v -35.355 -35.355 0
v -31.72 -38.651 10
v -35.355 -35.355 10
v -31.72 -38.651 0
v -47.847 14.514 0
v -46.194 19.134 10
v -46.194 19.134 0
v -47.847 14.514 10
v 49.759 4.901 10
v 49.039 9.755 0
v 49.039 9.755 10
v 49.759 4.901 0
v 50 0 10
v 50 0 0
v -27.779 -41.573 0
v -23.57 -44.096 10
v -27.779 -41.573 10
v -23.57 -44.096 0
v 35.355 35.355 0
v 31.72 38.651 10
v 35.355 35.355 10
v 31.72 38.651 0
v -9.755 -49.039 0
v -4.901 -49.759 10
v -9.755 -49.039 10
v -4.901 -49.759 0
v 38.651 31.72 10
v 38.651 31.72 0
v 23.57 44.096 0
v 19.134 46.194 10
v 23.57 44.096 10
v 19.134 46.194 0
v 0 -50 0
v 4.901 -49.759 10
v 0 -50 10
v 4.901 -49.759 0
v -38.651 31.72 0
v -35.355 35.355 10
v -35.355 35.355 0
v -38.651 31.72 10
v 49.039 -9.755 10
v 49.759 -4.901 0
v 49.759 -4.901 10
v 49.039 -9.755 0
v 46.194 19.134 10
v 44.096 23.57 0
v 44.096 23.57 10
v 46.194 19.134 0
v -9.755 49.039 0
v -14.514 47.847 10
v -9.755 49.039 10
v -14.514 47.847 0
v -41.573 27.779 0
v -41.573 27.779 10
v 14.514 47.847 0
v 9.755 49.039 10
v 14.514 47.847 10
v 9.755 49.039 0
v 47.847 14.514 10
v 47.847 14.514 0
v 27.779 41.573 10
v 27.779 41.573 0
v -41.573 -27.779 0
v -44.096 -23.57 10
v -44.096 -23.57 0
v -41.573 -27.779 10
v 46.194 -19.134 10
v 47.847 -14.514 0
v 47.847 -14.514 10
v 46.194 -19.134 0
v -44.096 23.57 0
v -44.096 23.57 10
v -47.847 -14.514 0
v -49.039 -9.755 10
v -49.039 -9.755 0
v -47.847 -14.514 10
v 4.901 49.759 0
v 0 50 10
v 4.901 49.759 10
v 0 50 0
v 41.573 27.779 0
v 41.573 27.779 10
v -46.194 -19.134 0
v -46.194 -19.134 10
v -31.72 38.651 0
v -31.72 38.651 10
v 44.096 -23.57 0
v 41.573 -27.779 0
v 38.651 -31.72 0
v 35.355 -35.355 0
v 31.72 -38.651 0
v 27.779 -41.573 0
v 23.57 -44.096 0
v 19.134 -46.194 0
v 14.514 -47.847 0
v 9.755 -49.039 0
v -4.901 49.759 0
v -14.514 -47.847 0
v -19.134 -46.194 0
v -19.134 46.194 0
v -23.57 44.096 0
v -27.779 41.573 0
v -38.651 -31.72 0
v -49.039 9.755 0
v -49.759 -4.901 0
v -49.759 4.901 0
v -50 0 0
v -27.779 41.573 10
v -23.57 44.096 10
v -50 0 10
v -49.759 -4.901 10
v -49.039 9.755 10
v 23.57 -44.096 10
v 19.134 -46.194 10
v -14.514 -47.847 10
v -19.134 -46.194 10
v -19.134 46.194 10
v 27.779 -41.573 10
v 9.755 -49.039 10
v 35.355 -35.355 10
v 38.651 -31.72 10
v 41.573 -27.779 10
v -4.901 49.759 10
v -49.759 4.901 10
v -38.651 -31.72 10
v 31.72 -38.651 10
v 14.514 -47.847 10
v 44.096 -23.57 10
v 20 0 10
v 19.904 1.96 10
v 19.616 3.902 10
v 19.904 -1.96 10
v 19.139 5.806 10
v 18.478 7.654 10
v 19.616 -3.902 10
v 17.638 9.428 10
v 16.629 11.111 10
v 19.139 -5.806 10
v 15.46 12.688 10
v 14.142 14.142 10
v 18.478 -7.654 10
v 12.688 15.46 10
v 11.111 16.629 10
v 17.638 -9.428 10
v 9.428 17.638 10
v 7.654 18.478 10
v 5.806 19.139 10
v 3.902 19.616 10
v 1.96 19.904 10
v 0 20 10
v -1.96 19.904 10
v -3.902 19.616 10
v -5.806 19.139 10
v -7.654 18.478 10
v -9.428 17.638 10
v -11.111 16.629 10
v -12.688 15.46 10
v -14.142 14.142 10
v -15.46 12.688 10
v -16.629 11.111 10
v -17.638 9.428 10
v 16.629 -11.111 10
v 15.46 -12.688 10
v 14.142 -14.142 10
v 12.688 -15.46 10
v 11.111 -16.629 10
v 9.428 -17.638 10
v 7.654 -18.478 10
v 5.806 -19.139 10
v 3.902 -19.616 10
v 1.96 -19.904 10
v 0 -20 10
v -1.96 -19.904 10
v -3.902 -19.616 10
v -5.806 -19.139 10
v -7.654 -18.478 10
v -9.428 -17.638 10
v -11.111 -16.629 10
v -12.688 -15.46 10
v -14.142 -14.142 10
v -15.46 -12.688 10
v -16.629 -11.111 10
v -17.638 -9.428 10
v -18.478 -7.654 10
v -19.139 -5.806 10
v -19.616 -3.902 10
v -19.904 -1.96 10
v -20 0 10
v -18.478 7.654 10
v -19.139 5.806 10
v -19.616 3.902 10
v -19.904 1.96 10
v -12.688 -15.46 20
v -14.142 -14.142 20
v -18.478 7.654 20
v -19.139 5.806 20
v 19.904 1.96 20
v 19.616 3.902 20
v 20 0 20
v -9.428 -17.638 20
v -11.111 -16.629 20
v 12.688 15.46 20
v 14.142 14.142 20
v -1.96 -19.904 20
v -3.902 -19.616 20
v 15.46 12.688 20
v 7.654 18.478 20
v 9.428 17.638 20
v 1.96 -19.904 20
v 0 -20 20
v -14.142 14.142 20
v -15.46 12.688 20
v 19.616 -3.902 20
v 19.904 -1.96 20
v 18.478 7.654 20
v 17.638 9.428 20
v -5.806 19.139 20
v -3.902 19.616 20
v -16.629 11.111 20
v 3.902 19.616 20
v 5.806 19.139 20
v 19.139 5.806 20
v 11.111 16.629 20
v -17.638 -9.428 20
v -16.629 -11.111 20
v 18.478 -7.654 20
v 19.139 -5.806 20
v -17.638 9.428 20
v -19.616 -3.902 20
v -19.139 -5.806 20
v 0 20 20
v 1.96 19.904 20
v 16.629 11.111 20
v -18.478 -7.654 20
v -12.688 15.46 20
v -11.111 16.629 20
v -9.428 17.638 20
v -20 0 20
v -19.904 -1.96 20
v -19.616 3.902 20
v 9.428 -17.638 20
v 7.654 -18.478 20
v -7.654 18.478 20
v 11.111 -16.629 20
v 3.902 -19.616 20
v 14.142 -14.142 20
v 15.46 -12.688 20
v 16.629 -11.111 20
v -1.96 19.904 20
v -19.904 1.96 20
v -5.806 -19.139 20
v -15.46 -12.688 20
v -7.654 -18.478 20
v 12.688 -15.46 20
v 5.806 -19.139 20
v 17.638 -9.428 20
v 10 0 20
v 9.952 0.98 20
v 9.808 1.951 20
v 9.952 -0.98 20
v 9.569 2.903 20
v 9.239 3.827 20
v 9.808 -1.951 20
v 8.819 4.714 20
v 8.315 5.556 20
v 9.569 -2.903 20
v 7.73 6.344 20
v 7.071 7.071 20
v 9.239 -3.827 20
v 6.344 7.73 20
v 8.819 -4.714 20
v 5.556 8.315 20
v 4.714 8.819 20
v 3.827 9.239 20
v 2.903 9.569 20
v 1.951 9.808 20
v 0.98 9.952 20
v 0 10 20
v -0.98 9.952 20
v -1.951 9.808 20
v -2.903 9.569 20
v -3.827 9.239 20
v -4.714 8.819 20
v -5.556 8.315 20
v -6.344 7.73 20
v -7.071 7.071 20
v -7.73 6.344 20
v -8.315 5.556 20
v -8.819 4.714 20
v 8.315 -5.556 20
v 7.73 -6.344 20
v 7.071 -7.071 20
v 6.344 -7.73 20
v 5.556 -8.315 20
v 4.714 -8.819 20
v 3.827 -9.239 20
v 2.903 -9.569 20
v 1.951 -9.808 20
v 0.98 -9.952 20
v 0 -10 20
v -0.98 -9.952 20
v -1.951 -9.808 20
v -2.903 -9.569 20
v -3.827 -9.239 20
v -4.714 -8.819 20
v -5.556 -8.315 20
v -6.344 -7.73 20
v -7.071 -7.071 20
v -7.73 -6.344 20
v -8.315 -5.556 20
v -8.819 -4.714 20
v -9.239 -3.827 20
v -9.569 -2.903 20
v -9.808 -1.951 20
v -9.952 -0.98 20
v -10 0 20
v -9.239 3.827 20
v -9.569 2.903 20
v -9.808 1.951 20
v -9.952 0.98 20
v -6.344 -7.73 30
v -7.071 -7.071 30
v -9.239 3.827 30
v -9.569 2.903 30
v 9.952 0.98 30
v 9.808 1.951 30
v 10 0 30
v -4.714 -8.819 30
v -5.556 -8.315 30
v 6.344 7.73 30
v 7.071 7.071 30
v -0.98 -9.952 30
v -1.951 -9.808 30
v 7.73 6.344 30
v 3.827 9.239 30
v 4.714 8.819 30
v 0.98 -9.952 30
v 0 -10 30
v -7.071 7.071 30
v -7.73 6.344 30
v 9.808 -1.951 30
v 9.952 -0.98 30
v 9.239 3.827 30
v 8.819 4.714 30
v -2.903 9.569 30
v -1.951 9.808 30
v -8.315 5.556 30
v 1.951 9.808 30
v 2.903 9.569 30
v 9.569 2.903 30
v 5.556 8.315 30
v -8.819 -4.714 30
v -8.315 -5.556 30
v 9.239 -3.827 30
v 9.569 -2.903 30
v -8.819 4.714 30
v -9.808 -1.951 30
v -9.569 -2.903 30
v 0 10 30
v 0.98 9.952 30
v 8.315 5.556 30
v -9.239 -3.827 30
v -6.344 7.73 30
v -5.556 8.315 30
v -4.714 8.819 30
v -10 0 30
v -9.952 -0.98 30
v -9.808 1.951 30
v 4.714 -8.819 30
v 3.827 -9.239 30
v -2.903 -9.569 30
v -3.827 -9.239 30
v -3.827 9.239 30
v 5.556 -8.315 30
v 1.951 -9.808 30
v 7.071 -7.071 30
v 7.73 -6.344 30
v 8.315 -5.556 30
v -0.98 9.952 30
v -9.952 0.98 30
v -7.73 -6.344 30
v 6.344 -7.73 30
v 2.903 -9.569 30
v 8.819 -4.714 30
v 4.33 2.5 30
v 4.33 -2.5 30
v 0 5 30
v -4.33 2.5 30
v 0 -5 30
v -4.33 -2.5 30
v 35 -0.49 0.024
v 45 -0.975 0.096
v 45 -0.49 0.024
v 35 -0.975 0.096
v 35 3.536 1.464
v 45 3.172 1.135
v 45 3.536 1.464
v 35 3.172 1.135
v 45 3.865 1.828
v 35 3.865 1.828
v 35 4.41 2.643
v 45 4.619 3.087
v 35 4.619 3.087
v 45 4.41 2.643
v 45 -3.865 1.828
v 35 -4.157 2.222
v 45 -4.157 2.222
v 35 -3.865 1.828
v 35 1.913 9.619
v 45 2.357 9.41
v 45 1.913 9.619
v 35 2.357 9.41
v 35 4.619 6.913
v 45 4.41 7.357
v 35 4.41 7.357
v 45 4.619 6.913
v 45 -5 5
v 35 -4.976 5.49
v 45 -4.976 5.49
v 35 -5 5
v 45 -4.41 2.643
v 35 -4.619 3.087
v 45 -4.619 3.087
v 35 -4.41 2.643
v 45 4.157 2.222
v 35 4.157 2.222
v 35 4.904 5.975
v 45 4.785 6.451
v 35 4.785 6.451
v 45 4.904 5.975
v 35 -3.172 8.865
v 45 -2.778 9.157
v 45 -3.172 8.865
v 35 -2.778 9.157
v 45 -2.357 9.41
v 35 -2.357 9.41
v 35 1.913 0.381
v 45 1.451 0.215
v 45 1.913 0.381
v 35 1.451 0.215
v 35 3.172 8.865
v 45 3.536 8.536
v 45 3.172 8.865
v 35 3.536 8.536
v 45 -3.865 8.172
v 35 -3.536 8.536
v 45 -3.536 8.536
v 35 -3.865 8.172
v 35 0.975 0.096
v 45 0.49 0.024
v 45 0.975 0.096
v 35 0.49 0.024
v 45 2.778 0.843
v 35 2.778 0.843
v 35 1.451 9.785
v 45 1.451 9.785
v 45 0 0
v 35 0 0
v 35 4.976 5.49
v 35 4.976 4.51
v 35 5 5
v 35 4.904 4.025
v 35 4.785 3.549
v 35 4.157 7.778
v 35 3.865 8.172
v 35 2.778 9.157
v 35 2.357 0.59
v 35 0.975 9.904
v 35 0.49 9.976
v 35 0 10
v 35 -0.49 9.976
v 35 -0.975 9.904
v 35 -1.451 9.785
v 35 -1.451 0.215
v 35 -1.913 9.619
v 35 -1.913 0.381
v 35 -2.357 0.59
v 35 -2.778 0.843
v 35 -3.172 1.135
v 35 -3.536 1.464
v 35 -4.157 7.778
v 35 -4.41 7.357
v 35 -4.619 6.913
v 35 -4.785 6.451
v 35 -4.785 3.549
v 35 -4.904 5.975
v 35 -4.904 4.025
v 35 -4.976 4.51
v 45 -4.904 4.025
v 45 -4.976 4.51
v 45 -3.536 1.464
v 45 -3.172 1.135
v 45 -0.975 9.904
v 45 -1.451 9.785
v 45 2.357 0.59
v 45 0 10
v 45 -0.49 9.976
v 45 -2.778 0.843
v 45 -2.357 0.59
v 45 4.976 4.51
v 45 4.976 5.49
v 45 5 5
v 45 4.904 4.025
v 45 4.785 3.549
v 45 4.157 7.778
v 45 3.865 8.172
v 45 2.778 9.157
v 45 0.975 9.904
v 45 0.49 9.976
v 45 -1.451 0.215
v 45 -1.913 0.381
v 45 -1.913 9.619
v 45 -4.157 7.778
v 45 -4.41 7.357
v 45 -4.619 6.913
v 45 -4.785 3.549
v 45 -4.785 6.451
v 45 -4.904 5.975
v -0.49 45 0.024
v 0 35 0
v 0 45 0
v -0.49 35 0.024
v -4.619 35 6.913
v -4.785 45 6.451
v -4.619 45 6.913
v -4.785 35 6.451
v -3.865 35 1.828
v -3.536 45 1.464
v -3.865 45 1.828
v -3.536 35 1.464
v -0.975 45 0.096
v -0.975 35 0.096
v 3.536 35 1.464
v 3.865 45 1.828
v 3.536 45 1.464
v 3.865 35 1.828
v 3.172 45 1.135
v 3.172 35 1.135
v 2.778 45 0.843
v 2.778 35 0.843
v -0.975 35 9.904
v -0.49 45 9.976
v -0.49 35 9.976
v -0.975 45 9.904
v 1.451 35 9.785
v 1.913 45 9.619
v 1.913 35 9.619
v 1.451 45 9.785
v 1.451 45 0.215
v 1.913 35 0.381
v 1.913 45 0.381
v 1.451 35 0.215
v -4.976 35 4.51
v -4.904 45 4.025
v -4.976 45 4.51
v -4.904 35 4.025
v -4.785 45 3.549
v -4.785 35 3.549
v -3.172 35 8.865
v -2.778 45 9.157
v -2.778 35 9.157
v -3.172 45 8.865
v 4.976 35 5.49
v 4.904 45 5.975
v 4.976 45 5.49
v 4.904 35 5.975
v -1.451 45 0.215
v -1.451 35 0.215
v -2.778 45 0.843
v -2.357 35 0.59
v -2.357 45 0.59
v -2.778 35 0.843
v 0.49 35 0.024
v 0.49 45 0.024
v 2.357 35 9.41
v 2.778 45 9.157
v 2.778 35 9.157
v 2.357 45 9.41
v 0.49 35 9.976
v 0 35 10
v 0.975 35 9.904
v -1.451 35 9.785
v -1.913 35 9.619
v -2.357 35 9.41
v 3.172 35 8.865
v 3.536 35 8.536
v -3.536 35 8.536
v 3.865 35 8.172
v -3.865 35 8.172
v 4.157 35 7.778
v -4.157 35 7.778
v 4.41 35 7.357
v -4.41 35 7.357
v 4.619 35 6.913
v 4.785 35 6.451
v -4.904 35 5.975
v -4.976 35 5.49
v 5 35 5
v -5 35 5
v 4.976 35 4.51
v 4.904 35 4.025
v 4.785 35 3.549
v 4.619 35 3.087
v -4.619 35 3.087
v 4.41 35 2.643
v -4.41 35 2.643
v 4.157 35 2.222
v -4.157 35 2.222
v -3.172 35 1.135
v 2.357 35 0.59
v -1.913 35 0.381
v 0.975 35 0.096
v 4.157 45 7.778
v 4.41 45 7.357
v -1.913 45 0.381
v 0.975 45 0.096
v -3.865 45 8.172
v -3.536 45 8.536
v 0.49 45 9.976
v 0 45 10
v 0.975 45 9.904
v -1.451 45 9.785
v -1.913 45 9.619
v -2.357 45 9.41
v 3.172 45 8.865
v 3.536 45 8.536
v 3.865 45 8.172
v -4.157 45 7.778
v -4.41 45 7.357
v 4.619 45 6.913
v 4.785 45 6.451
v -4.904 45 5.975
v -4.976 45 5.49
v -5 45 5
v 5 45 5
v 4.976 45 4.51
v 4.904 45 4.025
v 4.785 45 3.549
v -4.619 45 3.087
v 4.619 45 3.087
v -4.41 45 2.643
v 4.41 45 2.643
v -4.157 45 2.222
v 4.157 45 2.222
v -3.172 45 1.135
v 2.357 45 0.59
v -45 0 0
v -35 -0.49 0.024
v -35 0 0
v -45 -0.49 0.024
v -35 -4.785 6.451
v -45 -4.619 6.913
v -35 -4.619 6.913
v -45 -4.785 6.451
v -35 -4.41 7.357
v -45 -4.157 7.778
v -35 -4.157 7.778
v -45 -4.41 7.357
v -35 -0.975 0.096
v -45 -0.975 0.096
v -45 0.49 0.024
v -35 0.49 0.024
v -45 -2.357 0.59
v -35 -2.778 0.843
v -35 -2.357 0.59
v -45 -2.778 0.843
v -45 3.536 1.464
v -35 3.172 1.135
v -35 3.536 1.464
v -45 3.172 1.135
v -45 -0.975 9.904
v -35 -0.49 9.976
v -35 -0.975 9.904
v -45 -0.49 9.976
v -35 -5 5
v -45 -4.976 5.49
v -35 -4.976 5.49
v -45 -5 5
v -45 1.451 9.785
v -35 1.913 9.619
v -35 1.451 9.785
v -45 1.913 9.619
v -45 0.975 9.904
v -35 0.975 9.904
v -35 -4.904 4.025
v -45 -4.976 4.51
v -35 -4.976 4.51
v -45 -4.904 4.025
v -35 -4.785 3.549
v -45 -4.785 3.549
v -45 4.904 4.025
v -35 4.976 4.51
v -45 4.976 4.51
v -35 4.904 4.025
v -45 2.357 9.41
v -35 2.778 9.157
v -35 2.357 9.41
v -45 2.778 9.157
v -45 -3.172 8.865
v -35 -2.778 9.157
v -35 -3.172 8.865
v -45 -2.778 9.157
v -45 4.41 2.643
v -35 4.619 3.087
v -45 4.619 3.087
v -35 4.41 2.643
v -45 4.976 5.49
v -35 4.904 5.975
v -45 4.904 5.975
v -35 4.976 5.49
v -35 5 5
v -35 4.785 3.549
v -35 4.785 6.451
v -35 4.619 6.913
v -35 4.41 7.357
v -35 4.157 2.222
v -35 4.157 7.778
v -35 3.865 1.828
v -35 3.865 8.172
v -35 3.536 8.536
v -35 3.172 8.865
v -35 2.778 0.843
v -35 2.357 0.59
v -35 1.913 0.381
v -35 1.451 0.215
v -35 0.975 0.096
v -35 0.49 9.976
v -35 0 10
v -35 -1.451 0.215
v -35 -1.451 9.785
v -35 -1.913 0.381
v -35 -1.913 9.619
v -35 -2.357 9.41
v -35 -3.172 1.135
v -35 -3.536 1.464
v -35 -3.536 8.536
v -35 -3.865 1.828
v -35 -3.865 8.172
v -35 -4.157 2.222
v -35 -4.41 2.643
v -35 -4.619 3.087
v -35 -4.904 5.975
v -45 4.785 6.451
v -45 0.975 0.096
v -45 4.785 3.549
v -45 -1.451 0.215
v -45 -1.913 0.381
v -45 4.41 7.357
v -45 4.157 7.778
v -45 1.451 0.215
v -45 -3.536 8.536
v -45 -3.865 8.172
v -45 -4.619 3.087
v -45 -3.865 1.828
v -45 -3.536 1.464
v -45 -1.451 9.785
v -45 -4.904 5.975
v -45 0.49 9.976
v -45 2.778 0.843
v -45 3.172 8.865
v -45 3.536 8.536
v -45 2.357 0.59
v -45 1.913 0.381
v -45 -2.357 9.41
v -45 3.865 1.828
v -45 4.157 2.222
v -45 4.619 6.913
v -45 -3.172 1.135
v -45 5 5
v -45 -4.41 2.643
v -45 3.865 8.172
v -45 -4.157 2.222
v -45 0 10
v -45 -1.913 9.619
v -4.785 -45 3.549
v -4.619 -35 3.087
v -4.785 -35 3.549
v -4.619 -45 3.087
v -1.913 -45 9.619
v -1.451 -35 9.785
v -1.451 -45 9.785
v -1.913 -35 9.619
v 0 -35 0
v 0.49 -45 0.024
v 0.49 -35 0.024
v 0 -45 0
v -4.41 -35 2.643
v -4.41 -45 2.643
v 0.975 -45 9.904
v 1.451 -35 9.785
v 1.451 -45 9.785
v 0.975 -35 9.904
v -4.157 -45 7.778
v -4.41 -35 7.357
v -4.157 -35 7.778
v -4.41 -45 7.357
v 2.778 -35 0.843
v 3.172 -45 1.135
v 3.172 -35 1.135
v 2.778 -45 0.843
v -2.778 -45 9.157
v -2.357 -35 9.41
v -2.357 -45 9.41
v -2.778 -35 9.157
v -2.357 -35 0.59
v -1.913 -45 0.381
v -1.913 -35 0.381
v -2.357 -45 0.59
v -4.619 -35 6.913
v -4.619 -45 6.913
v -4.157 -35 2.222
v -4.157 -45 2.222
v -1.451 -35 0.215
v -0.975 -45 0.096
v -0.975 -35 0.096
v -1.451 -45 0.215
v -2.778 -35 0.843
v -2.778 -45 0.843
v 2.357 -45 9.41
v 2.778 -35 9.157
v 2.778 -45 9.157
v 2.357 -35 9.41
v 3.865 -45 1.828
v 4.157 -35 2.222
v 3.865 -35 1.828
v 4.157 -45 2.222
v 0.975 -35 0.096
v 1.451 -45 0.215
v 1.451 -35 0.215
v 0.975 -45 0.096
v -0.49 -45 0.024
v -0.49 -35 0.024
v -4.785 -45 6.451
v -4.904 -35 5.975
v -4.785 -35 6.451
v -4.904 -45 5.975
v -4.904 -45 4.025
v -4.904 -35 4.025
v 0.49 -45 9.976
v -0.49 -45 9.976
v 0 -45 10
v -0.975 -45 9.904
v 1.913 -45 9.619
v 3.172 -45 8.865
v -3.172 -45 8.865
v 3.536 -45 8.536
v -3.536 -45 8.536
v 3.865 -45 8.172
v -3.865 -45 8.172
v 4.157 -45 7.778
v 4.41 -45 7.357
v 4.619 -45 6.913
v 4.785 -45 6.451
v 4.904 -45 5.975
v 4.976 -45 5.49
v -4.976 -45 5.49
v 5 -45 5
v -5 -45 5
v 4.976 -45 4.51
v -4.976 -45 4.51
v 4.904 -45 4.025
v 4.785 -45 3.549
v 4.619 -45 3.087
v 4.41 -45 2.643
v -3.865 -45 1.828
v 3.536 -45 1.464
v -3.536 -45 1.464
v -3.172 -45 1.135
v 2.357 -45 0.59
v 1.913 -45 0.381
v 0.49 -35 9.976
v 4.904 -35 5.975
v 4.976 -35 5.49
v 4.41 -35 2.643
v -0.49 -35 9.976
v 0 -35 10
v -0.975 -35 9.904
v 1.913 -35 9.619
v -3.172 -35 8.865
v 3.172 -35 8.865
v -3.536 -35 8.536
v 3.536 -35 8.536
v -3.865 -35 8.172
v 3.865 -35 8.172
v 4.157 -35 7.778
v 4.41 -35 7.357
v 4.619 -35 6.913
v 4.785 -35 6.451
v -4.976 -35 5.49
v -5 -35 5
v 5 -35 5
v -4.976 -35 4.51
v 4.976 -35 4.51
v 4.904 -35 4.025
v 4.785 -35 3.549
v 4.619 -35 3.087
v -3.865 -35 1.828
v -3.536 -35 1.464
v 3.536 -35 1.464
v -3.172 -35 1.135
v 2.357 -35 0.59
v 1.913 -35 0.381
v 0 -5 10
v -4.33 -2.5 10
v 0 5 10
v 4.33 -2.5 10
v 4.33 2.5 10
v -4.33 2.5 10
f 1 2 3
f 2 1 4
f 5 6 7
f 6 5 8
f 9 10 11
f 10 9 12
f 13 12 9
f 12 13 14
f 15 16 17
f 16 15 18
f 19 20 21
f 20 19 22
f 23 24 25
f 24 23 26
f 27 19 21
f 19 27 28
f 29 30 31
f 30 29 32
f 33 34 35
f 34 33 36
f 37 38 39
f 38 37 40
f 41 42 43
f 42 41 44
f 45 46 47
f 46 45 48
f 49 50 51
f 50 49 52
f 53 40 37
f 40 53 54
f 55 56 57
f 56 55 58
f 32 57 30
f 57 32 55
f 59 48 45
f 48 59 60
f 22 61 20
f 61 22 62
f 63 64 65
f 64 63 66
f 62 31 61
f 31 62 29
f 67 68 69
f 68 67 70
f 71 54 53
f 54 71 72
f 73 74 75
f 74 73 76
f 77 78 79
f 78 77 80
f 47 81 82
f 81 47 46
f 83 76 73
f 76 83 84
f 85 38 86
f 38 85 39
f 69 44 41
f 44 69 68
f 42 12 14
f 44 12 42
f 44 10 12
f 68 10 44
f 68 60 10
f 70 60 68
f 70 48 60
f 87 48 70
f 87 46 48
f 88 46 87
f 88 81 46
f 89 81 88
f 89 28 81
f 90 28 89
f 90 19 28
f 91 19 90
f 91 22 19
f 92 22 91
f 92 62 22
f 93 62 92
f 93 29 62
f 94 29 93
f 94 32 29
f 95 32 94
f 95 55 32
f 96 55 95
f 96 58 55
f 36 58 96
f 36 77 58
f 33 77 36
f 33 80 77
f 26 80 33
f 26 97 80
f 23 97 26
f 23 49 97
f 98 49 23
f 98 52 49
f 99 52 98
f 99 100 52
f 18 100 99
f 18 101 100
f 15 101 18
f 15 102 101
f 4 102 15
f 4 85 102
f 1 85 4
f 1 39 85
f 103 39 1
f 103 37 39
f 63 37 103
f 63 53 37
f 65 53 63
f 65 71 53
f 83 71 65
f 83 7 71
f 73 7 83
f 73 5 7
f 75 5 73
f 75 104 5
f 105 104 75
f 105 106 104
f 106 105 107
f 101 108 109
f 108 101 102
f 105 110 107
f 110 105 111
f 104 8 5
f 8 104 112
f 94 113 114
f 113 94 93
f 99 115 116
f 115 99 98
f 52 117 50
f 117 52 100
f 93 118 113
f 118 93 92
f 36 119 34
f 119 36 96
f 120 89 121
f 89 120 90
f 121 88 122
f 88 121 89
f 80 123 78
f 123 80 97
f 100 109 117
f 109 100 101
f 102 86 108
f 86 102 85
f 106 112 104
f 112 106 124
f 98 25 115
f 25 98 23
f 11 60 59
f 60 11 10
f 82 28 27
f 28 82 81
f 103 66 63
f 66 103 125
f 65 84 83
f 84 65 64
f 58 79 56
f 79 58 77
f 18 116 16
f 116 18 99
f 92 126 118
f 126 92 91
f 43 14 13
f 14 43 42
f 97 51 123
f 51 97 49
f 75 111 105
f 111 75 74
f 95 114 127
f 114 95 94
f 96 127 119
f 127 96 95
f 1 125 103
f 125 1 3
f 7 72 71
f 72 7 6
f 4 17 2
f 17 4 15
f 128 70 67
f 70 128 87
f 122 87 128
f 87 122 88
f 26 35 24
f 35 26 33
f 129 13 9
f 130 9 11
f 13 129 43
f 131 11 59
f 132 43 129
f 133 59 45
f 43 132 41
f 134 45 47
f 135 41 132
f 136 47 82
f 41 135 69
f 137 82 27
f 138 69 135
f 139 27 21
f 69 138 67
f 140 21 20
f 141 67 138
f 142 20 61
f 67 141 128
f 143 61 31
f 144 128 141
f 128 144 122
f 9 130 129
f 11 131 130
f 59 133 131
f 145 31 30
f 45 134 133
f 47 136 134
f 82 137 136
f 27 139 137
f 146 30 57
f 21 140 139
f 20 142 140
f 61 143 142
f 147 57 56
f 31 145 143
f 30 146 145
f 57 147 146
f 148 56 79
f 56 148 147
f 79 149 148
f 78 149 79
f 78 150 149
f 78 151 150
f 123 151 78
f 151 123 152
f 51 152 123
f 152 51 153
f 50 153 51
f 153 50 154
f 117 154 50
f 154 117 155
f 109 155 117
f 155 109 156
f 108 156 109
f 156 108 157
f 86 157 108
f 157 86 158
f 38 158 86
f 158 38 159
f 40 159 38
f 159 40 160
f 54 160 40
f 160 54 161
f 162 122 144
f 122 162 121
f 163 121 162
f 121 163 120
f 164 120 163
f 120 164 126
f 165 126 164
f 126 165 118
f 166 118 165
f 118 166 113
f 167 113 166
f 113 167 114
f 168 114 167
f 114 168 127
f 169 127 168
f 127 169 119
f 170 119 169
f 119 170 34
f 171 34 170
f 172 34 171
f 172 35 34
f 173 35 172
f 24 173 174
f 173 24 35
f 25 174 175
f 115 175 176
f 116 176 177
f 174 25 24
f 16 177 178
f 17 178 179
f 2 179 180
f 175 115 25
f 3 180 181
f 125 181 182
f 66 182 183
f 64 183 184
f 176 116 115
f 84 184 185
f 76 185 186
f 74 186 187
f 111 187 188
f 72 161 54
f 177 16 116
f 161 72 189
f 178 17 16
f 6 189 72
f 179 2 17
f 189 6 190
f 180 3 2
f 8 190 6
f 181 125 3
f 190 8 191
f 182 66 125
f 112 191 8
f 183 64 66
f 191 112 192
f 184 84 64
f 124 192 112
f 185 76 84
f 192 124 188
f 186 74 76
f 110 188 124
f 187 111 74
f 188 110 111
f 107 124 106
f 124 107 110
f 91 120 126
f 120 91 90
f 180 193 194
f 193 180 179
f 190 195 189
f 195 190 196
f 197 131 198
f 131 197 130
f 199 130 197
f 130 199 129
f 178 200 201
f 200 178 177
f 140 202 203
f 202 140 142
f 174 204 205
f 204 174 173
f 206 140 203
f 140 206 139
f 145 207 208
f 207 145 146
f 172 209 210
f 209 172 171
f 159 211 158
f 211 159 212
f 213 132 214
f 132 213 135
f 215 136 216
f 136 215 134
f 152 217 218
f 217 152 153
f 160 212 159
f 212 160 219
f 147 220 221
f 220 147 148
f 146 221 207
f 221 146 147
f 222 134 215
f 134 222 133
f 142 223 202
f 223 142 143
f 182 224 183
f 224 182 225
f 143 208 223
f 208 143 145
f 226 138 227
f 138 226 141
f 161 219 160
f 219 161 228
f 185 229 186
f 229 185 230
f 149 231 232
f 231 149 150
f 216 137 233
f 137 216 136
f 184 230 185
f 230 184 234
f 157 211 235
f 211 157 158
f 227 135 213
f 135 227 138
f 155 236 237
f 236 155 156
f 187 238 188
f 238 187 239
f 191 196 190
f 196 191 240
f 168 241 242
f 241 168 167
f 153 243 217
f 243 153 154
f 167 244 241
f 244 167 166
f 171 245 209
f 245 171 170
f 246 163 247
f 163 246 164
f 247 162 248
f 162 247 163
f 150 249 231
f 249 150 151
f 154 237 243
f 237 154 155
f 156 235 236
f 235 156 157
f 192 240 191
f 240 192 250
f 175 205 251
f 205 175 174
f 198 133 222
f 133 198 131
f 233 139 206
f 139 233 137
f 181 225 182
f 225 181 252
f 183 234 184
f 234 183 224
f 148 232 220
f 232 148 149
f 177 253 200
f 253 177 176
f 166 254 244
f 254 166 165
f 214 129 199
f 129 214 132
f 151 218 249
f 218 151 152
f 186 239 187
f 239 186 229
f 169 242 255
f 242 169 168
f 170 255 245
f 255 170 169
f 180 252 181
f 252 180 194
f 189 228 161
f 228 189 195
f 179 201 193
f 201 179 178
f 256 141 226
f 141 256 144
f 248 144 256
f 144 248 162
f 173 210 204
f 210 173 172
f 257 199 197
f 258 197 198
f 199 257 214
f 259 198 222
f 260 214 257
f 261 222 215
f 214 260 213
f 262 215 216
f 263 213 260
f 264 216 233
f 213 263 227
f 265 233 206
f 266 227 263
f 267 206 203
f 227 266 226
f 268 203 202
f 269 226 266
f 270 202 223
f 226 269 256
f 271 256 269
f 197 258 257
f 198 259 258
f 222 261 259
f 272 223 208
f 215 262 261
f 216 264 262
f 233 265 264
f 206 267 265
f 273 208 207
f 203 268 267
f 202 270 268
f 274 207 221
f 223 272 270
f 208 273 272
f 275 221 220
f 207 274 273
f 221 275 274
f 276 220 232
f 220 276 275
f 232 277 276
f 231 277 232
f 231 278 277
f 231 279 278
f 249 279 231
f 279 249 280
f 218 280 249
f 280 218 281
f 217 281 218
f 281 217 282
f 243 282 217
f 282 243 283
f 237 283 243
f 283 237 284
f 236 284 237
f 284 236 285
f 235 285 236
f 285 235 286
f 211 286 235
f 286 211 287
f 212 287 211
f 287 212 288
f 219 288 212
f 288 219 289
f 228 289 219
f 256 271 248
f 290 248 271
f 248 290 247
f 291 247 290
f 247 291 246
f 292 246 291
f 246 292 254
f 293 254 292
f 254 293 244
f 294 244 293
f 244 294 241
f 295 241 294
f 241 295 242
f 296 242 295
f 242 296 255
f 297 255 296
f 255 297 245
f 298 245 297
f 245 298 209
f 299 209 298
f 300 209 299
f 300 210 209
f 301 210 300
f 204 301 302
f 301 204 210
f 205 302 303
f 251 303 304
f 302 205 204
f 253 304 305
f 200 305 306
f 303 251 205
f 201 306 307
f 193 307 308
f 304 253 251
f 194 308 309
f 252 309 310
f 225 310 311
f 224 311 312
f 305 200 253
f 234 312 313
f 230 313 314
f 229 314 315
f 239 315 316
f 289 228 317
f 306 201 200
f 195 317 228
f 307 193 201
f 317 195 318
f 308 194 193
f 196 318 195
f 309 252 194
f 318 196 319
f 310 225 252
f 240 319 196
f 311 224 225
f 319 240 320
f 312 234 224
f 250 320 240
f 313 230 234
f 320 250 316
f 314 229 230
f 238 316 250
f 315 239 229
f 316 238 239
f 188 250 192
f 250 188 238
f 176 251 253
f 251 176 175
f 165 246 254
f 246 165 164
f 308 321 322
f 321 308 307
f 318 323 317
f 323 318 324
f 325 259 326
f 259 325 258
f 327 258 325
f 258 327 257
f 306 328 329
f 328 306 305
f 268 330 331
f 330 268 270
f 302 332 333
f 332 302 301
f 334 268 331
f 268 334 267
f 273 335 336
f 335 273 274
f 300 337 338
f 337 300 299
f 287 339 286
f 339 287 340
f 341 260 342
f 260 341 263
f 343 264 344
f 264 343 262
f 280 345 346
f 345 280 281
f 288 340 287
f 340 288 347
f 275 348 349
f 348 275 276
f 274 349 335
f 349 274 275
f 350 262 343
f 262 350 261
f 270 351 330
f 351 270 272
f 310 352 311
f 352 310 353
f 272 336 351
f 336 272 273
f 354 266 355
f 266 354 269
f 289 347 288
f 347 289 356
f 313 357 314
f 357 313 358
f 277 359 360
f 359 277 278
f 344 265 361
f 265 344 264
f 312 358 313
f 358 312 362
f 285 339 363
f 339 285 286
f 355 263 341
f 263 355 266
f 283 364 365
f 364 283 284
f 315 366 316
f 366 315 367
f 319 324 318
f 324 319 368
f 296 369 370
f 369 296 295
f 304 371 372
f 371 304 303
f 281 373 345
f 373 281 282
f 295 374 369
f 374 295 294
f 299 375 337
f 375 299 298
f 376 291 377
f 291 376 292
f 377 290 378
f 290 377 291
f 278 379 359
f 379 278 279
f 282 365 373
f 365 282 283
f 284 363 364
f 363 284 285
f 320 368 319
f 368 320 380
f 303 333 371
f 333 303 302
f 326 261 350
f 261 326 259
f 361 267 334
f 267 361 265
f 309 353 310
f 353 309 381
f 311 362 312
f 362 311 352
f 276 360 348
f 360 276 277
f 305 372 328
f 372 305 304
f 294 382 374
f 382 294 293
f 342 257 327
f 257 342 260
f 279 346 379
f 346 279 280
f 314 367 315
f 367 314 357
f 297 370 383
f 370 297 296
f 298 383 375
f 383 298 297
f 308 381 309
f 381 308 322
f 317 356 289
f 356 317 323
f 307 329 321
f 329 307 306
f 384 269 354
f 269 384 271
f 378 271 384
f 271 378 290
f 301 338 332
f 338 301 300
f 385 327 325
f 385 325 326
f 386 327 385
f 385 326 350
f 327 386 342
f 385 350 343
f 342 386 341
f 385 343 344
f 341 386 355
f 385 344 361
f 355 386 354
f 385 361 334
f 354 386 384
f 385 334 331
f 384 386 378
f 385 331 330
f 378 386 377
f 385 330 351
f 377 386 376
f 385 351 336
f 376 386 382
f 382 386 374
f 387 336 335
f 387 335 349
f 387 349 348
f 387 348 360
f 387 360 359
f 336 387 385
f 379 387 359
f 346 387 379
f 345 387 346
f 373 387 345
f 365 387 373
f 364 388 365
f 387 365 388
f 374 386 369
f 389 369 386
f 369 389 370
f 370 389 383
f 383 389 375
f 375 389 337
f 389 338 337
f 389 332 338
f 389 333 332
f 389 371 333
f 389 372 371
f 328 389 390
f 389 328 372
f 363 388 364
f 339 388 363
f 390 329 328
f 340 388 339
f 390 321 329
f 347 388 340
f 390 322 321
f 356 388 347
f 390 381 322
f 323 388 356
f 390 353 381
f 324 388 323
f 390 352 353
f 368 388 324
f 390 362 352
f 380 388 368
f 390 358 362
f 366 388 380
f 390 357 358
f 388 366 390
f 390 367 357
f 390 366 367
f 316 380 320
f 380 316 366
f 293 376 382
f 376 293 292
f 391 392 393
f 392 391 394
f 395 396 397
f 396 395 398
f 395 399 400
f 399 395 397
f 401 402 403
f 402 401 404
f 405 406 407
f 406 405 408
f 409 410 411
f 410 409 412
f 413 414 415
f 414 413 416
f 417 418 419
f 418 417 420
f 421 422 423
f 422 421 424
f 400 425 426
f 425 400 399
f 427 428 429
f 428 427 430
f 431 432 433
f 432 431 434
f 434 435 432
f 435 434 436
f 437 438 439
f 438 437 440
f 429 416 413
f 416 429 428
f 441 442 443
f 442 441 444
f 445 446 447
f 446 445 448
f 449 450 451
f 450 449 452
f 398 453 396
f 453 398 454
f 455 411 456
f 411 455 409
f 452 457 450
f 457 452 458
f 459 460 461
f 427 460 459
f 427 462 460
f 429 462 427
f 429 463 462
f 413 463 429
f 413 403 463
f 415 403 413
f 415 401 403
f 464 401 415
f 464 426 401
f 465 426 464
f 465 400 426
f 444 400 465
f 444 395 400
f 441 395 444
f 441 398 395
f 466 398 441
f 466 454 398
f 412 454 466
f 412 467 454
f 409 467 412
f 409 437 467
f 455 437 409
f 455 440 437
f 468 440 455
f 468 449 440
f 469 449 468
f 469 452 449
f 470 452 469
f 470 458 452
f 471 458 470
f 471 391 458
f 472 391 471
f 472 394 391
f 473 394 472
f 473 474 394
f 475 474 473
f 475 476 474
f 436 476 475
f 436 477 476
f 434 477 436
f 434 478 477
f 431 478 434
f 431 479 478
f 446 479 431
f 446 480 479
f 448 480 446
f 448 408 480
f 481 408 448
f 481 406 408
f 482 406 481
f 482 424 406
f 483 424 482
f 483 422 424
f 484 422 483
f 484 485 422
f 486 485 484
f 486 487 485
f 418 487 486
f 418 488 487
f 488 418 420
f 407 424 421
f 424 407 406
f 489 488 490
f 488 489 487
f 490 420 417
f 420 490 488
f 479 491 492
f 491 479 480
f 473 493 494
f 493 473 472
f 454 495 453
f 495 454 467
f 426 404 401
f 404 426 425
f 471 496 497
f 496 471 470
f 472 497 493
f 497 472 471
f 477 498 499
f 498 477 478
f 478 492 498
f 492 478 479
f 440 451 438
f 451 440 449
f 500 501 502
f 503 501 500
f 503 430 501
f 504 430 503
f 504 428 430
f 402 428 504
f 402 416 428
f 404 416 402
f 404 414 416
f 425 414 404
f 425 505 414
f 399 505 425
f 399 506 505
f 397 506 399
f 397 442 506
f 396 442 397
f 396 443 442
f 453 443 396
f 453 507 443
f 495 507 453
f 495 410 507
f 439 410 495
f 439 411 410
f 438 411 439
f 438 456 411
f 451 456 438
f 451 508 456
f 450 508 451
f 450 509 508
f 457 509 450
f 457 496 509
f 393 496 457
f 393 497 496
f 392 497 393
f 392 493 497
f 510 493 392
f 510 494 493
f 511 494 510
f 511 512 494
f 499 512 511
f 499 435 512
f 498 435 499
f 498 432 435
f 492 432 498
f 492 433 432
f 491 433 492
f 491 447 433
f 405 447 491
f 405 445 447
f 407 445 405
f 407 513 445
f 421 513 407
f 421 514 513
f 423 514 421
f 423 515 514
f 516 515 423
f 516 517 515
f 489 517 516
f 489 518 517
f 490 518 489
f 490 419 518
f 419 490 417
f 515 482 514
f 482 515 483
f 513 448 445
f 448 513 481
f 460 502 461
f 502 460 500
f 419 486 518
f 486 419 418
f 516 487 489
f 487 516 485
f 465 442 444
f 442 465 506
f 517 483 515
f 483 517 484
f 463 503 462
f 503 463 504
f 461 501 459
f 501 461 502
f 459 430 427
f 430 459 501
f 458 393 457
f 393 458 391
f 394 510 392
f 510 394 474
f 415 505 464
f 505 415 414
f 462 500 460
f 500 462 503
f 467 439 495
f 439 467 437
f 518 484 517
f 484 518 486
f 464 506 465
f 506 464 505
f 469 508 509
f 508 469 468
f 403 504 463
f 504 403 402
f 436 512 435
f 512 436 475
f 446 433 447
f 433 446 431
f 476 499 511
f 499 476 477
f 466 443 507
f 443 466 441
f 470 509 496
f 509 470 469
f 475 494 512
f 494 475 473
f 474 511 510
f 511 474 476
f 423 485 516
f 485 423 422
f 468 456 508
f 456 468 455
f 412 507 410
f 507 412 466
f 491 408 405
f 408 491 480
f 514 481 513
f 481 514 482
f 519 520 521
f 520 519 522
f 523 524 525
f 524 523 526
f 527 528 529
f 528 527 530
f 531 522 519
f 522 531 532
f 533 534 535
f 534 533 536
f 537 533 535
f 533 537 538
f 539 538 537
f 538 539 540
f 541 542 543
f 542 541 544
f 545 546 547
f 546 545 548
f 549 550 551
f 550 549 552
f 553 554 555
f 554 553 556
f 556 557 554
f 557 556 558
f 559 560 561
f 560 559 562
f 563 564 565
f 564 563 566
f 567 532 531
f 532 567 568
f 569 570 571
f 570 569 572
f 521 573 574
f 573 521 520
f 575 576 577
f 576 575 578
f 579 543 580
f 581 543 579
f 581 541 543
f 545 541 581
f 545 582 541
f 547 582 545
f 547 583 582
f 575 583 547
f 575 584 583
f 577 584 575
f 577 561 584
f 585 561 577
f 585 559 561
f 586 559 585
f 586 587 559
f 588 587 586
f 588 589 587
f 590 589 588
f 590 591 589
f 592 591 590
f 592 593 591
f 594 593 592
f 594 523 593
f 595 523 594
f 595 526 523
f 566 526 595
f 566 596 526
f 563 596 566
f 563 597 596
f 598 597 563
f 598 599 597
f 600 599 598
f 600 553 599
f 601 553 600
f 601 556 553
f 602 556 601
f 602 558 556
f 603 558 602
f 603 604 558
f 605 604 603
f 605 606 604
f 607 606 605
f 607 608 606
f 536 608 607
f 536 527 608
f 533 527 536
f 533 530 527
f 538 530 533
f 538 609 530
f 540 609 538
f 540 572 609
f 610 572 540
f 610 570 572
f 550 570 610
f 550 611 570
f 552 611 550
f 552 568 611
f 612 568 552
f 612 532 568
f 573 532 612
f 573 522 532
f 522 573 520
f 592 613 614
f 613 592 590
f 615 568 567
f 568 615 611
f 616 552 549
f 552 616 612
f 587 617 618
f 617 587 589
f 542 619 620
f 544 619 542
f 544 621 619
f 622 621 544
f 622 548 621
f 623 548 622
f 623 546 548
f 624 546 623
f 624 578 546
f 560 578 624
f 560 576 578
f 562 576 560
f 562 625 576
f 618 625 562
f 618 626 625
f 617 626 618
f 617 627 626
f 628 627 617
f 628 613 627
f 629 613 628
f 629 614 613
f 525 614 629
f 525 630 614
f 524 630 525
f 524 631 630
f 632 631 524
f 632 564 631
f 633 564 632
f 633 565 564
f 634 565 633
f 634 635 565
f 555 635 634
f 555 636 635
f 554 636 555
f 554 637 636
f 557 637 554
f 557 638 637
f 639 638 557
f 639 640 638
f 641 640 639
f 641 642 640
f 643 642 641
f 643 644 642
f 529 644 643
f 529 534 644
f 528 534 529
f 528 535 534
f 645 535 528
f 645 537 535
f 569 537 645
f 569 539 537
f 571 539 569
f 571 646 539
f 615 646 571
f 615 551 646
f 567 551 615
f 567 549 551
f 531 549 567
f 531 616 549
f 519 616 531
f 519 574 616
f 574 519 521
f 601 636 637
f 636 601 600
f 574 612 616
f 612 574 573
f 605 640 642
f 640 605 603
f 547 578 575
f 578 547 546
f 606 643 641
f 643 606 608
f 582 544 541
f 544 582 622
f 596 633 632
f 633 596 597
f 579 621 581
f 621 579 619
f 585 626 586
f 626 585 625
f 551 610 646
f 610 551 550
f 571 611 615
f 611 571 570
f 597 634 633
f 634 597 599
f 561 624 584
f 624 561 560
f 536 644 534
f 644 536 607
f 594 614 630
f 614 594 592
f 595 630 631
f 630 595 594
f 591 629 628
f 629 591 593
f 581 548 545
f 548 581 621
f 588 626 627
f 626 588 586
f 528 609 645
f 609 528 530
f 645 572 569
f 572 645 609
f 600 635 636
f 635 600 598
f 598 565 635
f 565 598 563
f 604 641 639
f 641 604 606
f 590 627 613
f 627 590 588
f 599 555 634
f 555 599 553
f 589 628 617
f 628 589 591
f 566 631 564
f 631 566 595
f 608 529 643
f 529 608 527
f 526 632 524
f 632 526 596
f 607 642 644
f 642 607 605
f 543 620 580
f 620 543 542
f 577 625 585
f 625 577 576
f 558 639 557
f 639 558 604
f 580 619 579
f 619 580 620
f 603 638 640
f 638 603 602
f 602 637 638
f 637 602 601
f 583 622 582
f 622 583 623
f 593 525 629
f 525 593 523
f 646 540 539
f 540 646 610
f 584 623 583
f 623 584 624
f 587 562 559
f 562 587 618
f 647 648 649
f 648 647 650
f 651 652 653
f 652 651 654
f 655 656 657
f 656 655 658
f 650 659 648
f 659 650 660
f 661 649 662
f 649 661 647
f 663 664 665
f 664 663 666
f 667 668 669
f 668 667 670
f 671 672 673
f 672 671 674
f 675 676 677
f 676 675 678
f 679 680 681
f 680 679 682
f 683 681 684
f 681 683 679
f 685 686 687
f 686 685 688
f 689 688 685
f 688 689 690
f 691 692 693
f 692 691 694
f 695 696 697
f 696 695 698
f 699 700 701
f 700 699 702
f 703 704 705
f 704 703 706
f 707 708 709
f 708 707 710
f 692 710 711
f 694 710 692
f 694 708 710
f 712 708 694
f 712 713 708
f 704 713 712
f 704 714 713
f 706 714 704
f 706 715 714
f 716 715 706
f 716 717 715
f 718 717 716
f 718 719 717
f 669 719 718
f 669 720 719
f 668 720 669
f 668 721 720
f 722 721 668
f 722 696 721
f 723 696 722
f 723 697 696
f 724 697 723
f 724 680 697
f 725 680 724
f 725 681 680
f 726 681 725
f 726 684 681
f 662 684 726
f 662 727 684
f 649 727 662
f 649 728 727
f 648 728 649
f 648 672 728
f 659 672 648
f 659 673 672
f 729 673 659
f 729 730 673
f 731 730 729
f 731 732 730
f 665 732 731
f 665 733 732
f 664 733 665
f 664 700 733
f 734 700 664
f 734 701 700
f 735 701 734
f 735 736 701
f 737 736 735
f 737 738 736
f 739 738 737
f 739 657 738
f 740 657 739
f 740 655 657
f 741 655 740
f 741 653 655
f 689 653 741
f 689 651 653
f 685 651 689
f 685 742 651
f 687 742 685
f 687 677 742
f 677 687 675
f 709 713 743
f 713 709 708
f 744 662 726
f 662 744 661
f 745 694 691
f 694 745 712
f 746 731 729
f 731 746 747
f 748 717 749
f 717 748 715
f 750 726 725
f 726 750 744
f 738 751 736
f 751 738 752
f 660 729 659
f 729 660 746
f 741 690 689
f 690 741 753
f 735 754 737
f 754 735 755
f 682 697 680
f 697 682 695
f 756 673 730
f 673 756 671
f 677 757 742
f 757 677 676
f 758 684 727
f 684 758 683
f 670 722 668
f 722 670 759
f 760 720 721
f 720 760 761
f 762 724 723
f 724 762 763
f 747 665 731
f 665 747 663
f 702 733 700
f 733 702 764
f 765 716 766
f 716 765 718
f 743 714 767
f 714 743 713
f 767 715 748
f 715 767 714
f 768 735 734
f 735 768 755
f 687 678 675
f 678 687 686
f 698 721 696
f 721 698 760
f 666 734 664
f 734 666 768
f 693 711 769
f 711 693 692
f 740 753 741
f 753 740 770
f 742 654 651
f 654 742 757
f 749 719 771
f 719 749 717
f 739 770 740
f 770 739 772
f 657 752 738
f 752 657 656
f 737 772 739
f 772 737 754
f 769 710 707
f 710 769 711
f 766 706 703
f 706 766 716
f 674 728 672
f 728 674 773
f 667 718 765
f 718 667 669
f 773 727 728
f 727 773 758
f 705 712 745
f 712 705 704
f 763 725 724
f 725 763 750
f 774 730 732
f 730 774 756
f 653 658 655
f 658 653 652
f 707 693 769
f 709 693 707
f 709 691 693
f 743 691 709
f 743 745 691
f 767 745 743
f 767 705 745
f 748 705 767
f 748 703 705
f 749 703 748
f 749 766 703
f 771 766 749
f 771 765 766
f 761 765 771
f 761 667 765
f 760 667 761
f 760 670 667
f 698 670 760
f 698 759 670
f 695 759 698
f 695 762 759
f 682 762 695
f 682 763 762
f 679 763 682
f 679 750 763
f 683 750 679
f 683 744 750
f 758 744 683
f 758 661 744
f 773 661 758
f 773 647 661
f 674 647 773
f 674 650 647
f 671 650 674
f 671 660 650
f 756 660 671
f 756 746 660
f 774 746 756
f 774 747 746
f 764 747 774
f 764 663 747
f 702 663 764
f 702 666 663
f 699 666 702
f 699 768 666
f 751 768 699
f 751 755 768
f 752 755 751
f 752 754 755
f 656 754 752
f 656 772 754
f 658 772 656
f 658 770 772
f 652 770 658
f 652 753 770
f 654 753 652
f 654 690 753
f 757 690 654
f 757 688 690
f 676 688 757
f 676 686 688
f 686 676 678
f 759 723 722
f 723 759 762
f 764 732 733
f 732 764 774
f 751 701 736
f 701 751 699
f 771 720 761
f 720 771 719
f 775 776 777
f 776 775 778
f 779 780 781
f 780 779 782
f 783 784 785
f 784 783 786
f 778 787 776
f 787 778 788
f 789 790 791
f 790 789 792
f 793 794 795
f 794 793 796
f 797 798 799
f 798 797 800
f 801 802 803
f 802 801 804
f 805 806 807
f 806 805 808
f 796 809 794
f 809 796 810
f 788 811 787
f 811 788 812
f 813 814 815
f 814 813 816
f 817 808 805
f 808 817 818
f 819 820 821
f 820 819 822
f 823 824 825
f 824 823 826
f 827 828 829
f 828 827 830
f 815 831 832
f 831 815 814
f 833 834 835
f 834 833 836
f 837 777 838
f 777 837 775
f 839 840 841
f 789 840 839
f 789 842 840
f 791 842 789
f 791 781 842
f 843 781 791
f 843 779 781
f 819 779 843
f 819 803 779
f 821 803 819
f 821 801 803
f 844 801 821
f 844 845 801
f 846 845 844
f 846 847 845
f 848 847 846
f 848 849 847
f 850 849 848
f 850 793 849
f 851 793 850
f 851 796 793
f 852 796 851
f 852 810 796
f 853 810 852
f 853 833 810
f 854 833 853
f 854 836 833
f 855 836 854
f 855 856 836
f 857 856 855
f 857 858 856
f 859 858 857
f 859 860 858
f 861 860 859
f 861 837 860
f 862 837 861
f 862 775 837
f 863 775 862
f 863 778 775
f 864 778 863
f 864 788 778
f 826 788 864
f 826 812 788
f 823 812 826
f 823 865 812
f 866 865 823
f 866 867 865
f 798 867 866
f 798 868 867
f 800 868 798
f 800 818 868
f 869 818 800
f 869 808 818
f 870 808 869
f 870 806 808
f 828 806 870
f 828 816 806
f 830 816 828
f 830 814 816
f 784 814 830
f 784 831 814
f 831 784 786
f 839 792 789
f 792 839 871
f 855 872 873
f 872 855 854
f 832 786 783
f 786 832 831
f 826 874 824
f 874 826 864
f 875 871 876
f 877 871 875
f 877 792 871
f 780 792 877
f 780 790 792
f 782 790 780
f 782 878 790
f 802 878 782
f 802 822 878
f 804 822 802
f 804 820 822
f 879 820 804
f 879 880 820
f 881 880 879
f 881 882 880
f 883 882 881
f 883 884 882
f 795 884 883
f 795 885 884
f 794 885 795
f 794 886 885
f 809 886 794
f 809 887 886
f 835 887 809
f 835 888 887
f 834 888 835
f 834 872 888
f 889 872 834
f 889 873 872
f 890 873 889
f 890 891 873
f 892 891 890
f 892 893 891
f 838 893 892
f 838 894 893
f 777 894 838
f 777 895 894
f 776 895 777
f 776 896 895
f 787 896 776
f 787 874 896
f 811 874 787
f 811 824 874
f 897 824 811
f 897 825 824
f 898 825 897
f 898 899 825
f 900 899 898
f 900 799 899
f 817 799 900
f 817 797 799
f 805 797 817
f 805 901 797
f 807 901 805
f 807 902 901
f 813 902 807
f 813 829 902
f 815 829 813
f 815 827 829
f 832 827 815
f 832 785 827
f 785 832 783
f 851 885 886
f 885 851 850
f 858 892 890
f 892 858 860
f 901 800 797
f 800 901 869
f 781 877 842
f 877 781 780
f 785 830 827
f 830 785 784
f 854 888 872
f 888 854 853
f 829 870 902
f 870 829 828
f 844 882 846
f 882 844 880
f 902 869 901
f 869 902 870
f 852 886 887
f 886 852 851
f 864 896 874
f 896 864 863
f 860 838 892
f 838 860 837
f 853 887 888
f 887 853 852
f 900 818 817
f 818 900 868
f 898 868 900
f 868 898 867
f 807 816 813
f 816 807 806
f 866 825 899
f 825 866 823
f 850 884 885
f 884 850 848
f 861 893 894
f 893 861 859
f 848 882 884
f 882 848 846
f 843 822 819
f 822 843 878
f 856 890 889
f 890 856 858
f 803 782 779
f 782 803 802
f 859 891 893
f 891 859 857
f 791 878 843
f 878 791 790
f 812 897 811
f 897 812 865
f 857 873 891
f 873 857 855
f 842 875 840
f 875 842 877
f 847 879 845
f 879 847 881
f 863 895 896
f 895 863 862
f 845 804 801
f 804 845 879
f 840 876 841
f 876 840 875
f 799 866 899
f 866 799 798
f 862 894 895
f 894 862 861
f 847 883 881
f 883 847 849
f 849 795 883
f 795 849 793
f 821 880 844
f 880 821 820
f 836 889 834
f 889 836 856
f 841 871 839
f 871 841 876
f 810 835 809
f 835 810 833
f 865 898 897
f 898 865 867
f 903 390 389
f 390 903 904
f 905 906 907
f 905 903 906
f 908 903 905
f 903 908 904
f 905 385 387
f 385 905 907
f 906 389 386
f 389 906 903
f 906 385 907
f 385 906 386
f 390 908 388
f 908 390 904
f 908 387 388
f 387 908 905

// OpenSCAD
module handwheel() {
    difference() {
        union() {
            // Outer disk with thick rim
            cylinder(h=10, r=50, $fn=64);
            // Central hub
            translate([0, 0, 10])
                cylinder(h=10, r=20, $fn=64);
            // Cylindrical post/shaft
            translate([0, 0, 20])
                cylinder(h=10, r=10, $fn=64);
        }
        // Hexagonal bore
        translate([0, 0, 10])
            rotate([0, 0, 90])
                linear_extrude(height=30)
                    polygon(points=[[5, 0], [2.5, 4.33], [-2.5, 4.33], [-5, 0], [-2.5, -4.33], [2.5, -4.33]]);
        // Curved rectangular cutouts
        for (i = [0:3]) {
            rotate([0, 0, i * 90])
                translate([35, 0, 5])
                    rotate([0, 90, 0])
                        cylinder(h=10, r=5, $fn=64);
        }
    }
}

handwheel();
